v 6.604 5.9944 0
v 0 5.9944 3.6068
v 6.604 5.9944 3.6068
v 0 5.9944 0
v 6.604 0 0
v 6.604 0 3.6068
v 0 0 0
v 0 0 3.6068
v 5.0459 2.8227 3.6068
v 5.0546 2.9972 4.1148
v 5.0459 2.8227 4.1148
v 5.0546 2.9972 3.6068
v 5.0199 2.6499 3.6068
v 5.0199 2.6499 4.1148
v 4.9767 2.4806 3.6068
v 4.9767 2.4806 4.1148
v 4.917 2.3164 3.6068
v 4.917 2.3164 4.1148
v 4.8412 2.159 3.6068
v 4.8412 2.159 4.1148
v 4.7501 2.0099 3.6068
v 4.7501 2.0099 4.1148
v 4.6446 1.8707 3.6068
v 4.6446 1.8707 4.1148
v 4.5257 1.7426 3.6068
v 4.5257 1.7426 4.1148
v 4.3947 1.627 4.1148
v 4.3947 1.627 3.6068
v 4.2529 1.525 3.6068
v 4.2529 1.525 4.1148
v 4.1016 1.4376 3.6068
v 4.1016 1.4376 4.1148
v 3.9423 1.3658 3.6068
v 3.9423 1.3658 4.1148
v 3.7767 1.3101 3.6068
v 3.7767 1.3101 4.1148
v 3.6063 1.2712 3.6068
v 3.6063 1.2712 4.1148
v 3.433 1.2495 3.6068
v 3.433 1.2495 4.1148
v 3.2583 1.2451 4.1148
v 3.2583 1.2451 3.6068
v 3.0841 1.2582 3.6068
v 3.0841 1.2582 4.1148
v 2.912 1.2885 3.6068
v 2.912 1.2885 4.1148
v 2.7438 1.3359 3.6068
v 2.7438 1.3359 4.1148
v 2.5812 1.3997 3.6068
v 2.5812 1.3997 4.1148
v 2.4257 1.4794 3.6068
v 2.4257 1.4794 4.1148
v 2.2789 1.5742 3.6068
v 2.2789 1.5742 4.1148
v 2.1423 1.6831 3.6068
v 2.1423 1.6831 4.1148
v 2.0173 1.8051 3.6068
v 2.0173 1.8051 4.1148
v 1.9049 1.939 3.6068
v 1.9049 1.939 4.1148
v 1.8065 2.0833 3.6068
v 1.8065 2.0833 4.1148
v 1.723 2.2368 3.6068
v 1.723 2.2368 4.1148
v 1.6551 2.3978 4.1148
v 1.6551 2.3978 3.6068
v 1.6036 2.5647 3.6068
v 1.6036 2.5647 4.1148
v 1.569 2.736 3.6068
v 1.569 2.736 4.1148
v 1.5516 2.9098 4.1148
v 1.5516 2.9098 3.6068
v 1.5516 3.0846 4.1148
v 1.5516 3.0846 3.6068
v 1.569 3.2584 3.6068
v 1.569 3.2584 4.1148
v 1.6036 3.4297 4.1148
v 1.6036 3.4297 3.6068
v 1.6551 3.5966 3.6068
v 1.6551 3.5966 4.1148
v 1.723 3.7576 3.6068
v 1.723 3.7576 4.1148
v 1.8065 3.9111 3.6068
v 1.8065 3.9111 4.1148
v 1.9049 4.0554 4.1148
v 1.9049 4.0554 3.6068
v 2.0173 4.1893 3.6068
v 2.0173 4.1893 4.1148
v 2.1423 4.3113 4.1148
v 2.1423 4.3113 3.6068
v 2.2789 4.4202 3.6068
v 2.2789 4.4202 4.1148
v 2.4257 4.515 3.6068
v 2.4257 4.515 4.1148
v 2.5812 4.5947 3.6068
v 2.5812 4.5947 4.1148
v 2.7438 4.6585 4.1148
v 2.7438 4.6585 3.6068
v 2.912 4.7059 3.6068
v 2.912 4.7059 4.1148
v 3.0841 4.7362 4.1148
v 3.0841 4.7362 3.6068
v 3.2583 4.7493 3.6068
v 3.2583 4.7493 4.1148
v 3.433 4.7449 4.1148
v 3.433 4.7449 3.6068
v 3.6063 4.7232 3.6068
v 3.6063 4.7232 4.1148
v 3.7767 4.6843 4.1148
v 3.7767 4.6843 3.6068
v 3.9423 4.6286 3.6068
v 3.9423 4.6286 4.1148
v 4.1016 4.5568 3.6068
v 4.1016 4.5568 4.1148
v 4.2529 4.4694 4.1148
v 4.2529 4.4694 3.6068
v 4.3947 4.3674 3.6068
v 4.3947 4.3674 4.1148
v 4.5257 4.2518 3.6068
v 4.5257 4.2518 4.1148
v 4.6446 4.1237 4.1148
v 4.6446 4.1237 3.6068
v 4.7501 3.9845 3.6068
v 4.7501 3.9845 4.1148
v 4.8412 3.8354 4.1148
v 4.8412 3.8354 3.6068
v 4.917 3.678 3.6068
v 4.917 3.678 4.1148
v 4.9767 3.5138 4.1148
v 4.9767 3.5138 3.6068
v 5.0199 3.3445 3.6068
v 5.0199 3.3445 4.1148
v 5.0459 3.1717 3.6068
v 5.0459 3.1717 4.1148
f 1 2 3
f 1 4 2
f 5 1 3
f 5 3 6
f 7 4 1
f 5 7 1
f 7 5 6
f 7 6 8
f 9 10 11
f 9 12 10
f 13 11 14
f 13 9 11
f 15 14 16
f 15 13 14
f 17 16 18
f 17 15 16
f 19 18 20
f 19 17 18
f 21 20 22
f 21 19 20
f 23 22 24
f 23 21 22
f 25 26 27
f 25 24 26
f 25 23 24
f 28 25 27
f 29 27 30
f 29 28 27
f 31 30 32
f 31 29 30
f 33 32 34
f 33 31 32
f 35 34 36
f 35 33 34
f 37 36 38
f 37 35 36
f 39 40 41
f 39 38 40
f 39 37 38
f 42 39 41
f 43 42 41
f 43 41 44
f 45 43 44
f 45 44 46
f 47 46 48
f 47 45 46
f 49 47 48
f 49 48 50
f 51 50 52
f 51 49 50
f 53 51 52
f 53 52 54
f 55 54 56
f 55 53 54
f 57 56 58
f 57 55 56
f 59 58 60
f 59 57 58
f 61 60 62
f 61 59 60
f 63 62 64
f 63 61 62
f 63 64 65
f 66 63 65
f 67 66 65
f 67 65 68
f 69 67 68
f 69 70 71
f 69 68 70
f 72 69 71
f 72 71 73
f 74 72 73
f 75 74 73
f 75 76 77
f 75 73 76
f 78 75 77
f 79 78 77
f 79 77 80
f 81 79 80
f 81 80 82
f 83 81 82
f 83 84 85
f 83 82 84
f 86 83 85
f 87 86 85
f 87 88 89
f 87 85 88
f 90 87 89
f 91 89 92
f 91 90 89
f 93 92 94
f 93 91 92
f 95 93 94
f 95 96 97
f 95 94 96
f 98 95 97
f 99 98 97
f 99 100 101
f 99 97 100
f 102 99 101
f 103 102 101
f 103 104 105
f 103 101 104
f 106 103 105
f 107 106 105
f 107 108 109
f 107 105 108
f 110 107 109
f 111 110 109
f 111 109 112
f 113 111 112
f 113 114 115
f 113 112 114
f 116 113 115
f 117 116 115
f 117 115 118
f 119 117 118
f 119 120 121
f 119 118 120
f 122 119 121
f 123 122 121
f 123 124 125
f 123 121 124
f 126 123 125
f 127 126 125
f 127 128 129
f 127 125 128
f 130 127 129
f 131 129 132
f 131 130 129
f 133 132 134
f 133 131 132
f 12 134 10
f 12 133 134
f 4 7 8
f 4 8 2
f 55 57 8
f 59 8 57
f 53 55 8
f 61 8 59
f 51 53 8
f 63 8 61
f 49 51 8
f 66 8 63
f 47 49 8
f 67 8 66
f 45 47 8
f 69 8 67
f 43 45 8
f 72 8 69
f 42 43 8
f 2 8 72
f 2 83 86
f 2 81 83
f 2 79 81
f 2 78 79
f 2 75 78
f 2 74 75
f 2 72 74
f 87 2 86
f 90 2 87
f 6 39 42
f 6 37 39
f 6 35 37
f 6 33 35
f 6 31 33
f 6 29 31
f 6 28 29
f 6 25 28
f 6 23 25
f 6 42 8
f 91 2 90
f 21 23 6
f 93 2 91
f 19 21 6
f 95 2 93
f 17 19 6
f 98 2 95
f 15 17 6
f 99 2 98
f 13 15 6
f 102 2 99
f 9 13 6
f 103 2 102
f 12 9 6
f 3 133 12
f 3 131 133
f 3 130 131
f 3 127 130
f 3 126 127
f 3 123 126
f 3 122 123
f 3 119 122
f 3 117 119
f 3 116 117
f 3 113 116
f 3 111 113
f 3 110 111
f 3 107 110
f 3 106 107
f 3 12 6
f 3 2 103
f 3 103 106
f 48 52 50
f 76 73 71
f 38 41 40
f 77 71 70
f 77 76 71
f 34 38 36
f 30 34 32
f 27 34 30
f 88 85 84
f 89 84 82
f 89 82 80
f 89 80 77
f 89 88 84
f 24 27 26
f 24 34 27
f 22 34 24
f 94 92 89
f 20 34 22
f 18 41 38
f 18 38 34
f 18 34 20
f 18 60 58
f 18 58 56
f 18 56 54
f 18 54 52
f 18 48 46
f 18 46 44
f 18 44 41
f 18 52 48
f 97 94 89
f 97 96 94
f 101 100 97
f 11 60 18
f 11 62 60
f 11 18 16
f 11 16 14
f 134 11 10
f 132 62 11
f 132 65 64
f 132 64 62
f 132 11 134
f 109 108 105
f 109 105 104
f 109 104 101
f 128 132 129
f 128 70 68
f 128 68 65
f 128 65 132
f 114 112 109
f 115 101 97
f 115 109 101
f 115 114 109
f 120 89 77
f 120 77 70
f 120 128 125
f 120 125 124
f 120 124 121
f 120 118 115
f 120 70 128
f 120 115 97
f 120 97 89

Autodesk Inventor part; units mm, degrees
ref_plane "YZ Plane" through (0, 0, 0) normal (1, 0, 0) x (0, 1, 0)
ref_plane "XZ Plane" through (0, 0, 0) normal (0, 1, 0) x (-1, 0, 0)
ref_plane "XY Plane" through (0, 0, 0) normal (0, 0, 1) x (1, 0, 0)
sketch "Sketch1" plane through (0, 0, 0) normal (0, 0, 1) x (1, 0, 0)
  line L0 (0, 5.9944) -> (6.604, 5.9944)
  line L1 (6.604, 5.9944) -> (6.604, 0)
  line L2 (6.604, 0) -> (0, 0)
  line L3 (0, 0) -> (0, 5.9944)
  dimension "d0" = 5.9944
  dimension "d1" = 6.604
extrude "Extrusion1" add sketch "Sketch1" along normal blind 3.6068
sketch "Sketch2" plane through (0, 0, 3.6068) normal (0, 0, 1) x (1, 0, 0)
  circle A0 centre (3.302, 2.9972) radius 1.7526
  line L0 (6.604, 5.9944) -> (0, 5.9944) projected
  line L1 (0, 5.9944) -> (0, 0) projected
  line L2 (0, 0) -> (6.604, 0) projected
  line L3 (6.604, 0) -> (6.604, 5.9944) projected
  point P0 (3.302, 5.9944)
  point P1 (6.604, 2.9972)
  dimension "d4" = 3.5052
extrude "Extrusion2" add sketch "Sketch2" along normal blind 0.508 contours A0
properties part number "Button"
